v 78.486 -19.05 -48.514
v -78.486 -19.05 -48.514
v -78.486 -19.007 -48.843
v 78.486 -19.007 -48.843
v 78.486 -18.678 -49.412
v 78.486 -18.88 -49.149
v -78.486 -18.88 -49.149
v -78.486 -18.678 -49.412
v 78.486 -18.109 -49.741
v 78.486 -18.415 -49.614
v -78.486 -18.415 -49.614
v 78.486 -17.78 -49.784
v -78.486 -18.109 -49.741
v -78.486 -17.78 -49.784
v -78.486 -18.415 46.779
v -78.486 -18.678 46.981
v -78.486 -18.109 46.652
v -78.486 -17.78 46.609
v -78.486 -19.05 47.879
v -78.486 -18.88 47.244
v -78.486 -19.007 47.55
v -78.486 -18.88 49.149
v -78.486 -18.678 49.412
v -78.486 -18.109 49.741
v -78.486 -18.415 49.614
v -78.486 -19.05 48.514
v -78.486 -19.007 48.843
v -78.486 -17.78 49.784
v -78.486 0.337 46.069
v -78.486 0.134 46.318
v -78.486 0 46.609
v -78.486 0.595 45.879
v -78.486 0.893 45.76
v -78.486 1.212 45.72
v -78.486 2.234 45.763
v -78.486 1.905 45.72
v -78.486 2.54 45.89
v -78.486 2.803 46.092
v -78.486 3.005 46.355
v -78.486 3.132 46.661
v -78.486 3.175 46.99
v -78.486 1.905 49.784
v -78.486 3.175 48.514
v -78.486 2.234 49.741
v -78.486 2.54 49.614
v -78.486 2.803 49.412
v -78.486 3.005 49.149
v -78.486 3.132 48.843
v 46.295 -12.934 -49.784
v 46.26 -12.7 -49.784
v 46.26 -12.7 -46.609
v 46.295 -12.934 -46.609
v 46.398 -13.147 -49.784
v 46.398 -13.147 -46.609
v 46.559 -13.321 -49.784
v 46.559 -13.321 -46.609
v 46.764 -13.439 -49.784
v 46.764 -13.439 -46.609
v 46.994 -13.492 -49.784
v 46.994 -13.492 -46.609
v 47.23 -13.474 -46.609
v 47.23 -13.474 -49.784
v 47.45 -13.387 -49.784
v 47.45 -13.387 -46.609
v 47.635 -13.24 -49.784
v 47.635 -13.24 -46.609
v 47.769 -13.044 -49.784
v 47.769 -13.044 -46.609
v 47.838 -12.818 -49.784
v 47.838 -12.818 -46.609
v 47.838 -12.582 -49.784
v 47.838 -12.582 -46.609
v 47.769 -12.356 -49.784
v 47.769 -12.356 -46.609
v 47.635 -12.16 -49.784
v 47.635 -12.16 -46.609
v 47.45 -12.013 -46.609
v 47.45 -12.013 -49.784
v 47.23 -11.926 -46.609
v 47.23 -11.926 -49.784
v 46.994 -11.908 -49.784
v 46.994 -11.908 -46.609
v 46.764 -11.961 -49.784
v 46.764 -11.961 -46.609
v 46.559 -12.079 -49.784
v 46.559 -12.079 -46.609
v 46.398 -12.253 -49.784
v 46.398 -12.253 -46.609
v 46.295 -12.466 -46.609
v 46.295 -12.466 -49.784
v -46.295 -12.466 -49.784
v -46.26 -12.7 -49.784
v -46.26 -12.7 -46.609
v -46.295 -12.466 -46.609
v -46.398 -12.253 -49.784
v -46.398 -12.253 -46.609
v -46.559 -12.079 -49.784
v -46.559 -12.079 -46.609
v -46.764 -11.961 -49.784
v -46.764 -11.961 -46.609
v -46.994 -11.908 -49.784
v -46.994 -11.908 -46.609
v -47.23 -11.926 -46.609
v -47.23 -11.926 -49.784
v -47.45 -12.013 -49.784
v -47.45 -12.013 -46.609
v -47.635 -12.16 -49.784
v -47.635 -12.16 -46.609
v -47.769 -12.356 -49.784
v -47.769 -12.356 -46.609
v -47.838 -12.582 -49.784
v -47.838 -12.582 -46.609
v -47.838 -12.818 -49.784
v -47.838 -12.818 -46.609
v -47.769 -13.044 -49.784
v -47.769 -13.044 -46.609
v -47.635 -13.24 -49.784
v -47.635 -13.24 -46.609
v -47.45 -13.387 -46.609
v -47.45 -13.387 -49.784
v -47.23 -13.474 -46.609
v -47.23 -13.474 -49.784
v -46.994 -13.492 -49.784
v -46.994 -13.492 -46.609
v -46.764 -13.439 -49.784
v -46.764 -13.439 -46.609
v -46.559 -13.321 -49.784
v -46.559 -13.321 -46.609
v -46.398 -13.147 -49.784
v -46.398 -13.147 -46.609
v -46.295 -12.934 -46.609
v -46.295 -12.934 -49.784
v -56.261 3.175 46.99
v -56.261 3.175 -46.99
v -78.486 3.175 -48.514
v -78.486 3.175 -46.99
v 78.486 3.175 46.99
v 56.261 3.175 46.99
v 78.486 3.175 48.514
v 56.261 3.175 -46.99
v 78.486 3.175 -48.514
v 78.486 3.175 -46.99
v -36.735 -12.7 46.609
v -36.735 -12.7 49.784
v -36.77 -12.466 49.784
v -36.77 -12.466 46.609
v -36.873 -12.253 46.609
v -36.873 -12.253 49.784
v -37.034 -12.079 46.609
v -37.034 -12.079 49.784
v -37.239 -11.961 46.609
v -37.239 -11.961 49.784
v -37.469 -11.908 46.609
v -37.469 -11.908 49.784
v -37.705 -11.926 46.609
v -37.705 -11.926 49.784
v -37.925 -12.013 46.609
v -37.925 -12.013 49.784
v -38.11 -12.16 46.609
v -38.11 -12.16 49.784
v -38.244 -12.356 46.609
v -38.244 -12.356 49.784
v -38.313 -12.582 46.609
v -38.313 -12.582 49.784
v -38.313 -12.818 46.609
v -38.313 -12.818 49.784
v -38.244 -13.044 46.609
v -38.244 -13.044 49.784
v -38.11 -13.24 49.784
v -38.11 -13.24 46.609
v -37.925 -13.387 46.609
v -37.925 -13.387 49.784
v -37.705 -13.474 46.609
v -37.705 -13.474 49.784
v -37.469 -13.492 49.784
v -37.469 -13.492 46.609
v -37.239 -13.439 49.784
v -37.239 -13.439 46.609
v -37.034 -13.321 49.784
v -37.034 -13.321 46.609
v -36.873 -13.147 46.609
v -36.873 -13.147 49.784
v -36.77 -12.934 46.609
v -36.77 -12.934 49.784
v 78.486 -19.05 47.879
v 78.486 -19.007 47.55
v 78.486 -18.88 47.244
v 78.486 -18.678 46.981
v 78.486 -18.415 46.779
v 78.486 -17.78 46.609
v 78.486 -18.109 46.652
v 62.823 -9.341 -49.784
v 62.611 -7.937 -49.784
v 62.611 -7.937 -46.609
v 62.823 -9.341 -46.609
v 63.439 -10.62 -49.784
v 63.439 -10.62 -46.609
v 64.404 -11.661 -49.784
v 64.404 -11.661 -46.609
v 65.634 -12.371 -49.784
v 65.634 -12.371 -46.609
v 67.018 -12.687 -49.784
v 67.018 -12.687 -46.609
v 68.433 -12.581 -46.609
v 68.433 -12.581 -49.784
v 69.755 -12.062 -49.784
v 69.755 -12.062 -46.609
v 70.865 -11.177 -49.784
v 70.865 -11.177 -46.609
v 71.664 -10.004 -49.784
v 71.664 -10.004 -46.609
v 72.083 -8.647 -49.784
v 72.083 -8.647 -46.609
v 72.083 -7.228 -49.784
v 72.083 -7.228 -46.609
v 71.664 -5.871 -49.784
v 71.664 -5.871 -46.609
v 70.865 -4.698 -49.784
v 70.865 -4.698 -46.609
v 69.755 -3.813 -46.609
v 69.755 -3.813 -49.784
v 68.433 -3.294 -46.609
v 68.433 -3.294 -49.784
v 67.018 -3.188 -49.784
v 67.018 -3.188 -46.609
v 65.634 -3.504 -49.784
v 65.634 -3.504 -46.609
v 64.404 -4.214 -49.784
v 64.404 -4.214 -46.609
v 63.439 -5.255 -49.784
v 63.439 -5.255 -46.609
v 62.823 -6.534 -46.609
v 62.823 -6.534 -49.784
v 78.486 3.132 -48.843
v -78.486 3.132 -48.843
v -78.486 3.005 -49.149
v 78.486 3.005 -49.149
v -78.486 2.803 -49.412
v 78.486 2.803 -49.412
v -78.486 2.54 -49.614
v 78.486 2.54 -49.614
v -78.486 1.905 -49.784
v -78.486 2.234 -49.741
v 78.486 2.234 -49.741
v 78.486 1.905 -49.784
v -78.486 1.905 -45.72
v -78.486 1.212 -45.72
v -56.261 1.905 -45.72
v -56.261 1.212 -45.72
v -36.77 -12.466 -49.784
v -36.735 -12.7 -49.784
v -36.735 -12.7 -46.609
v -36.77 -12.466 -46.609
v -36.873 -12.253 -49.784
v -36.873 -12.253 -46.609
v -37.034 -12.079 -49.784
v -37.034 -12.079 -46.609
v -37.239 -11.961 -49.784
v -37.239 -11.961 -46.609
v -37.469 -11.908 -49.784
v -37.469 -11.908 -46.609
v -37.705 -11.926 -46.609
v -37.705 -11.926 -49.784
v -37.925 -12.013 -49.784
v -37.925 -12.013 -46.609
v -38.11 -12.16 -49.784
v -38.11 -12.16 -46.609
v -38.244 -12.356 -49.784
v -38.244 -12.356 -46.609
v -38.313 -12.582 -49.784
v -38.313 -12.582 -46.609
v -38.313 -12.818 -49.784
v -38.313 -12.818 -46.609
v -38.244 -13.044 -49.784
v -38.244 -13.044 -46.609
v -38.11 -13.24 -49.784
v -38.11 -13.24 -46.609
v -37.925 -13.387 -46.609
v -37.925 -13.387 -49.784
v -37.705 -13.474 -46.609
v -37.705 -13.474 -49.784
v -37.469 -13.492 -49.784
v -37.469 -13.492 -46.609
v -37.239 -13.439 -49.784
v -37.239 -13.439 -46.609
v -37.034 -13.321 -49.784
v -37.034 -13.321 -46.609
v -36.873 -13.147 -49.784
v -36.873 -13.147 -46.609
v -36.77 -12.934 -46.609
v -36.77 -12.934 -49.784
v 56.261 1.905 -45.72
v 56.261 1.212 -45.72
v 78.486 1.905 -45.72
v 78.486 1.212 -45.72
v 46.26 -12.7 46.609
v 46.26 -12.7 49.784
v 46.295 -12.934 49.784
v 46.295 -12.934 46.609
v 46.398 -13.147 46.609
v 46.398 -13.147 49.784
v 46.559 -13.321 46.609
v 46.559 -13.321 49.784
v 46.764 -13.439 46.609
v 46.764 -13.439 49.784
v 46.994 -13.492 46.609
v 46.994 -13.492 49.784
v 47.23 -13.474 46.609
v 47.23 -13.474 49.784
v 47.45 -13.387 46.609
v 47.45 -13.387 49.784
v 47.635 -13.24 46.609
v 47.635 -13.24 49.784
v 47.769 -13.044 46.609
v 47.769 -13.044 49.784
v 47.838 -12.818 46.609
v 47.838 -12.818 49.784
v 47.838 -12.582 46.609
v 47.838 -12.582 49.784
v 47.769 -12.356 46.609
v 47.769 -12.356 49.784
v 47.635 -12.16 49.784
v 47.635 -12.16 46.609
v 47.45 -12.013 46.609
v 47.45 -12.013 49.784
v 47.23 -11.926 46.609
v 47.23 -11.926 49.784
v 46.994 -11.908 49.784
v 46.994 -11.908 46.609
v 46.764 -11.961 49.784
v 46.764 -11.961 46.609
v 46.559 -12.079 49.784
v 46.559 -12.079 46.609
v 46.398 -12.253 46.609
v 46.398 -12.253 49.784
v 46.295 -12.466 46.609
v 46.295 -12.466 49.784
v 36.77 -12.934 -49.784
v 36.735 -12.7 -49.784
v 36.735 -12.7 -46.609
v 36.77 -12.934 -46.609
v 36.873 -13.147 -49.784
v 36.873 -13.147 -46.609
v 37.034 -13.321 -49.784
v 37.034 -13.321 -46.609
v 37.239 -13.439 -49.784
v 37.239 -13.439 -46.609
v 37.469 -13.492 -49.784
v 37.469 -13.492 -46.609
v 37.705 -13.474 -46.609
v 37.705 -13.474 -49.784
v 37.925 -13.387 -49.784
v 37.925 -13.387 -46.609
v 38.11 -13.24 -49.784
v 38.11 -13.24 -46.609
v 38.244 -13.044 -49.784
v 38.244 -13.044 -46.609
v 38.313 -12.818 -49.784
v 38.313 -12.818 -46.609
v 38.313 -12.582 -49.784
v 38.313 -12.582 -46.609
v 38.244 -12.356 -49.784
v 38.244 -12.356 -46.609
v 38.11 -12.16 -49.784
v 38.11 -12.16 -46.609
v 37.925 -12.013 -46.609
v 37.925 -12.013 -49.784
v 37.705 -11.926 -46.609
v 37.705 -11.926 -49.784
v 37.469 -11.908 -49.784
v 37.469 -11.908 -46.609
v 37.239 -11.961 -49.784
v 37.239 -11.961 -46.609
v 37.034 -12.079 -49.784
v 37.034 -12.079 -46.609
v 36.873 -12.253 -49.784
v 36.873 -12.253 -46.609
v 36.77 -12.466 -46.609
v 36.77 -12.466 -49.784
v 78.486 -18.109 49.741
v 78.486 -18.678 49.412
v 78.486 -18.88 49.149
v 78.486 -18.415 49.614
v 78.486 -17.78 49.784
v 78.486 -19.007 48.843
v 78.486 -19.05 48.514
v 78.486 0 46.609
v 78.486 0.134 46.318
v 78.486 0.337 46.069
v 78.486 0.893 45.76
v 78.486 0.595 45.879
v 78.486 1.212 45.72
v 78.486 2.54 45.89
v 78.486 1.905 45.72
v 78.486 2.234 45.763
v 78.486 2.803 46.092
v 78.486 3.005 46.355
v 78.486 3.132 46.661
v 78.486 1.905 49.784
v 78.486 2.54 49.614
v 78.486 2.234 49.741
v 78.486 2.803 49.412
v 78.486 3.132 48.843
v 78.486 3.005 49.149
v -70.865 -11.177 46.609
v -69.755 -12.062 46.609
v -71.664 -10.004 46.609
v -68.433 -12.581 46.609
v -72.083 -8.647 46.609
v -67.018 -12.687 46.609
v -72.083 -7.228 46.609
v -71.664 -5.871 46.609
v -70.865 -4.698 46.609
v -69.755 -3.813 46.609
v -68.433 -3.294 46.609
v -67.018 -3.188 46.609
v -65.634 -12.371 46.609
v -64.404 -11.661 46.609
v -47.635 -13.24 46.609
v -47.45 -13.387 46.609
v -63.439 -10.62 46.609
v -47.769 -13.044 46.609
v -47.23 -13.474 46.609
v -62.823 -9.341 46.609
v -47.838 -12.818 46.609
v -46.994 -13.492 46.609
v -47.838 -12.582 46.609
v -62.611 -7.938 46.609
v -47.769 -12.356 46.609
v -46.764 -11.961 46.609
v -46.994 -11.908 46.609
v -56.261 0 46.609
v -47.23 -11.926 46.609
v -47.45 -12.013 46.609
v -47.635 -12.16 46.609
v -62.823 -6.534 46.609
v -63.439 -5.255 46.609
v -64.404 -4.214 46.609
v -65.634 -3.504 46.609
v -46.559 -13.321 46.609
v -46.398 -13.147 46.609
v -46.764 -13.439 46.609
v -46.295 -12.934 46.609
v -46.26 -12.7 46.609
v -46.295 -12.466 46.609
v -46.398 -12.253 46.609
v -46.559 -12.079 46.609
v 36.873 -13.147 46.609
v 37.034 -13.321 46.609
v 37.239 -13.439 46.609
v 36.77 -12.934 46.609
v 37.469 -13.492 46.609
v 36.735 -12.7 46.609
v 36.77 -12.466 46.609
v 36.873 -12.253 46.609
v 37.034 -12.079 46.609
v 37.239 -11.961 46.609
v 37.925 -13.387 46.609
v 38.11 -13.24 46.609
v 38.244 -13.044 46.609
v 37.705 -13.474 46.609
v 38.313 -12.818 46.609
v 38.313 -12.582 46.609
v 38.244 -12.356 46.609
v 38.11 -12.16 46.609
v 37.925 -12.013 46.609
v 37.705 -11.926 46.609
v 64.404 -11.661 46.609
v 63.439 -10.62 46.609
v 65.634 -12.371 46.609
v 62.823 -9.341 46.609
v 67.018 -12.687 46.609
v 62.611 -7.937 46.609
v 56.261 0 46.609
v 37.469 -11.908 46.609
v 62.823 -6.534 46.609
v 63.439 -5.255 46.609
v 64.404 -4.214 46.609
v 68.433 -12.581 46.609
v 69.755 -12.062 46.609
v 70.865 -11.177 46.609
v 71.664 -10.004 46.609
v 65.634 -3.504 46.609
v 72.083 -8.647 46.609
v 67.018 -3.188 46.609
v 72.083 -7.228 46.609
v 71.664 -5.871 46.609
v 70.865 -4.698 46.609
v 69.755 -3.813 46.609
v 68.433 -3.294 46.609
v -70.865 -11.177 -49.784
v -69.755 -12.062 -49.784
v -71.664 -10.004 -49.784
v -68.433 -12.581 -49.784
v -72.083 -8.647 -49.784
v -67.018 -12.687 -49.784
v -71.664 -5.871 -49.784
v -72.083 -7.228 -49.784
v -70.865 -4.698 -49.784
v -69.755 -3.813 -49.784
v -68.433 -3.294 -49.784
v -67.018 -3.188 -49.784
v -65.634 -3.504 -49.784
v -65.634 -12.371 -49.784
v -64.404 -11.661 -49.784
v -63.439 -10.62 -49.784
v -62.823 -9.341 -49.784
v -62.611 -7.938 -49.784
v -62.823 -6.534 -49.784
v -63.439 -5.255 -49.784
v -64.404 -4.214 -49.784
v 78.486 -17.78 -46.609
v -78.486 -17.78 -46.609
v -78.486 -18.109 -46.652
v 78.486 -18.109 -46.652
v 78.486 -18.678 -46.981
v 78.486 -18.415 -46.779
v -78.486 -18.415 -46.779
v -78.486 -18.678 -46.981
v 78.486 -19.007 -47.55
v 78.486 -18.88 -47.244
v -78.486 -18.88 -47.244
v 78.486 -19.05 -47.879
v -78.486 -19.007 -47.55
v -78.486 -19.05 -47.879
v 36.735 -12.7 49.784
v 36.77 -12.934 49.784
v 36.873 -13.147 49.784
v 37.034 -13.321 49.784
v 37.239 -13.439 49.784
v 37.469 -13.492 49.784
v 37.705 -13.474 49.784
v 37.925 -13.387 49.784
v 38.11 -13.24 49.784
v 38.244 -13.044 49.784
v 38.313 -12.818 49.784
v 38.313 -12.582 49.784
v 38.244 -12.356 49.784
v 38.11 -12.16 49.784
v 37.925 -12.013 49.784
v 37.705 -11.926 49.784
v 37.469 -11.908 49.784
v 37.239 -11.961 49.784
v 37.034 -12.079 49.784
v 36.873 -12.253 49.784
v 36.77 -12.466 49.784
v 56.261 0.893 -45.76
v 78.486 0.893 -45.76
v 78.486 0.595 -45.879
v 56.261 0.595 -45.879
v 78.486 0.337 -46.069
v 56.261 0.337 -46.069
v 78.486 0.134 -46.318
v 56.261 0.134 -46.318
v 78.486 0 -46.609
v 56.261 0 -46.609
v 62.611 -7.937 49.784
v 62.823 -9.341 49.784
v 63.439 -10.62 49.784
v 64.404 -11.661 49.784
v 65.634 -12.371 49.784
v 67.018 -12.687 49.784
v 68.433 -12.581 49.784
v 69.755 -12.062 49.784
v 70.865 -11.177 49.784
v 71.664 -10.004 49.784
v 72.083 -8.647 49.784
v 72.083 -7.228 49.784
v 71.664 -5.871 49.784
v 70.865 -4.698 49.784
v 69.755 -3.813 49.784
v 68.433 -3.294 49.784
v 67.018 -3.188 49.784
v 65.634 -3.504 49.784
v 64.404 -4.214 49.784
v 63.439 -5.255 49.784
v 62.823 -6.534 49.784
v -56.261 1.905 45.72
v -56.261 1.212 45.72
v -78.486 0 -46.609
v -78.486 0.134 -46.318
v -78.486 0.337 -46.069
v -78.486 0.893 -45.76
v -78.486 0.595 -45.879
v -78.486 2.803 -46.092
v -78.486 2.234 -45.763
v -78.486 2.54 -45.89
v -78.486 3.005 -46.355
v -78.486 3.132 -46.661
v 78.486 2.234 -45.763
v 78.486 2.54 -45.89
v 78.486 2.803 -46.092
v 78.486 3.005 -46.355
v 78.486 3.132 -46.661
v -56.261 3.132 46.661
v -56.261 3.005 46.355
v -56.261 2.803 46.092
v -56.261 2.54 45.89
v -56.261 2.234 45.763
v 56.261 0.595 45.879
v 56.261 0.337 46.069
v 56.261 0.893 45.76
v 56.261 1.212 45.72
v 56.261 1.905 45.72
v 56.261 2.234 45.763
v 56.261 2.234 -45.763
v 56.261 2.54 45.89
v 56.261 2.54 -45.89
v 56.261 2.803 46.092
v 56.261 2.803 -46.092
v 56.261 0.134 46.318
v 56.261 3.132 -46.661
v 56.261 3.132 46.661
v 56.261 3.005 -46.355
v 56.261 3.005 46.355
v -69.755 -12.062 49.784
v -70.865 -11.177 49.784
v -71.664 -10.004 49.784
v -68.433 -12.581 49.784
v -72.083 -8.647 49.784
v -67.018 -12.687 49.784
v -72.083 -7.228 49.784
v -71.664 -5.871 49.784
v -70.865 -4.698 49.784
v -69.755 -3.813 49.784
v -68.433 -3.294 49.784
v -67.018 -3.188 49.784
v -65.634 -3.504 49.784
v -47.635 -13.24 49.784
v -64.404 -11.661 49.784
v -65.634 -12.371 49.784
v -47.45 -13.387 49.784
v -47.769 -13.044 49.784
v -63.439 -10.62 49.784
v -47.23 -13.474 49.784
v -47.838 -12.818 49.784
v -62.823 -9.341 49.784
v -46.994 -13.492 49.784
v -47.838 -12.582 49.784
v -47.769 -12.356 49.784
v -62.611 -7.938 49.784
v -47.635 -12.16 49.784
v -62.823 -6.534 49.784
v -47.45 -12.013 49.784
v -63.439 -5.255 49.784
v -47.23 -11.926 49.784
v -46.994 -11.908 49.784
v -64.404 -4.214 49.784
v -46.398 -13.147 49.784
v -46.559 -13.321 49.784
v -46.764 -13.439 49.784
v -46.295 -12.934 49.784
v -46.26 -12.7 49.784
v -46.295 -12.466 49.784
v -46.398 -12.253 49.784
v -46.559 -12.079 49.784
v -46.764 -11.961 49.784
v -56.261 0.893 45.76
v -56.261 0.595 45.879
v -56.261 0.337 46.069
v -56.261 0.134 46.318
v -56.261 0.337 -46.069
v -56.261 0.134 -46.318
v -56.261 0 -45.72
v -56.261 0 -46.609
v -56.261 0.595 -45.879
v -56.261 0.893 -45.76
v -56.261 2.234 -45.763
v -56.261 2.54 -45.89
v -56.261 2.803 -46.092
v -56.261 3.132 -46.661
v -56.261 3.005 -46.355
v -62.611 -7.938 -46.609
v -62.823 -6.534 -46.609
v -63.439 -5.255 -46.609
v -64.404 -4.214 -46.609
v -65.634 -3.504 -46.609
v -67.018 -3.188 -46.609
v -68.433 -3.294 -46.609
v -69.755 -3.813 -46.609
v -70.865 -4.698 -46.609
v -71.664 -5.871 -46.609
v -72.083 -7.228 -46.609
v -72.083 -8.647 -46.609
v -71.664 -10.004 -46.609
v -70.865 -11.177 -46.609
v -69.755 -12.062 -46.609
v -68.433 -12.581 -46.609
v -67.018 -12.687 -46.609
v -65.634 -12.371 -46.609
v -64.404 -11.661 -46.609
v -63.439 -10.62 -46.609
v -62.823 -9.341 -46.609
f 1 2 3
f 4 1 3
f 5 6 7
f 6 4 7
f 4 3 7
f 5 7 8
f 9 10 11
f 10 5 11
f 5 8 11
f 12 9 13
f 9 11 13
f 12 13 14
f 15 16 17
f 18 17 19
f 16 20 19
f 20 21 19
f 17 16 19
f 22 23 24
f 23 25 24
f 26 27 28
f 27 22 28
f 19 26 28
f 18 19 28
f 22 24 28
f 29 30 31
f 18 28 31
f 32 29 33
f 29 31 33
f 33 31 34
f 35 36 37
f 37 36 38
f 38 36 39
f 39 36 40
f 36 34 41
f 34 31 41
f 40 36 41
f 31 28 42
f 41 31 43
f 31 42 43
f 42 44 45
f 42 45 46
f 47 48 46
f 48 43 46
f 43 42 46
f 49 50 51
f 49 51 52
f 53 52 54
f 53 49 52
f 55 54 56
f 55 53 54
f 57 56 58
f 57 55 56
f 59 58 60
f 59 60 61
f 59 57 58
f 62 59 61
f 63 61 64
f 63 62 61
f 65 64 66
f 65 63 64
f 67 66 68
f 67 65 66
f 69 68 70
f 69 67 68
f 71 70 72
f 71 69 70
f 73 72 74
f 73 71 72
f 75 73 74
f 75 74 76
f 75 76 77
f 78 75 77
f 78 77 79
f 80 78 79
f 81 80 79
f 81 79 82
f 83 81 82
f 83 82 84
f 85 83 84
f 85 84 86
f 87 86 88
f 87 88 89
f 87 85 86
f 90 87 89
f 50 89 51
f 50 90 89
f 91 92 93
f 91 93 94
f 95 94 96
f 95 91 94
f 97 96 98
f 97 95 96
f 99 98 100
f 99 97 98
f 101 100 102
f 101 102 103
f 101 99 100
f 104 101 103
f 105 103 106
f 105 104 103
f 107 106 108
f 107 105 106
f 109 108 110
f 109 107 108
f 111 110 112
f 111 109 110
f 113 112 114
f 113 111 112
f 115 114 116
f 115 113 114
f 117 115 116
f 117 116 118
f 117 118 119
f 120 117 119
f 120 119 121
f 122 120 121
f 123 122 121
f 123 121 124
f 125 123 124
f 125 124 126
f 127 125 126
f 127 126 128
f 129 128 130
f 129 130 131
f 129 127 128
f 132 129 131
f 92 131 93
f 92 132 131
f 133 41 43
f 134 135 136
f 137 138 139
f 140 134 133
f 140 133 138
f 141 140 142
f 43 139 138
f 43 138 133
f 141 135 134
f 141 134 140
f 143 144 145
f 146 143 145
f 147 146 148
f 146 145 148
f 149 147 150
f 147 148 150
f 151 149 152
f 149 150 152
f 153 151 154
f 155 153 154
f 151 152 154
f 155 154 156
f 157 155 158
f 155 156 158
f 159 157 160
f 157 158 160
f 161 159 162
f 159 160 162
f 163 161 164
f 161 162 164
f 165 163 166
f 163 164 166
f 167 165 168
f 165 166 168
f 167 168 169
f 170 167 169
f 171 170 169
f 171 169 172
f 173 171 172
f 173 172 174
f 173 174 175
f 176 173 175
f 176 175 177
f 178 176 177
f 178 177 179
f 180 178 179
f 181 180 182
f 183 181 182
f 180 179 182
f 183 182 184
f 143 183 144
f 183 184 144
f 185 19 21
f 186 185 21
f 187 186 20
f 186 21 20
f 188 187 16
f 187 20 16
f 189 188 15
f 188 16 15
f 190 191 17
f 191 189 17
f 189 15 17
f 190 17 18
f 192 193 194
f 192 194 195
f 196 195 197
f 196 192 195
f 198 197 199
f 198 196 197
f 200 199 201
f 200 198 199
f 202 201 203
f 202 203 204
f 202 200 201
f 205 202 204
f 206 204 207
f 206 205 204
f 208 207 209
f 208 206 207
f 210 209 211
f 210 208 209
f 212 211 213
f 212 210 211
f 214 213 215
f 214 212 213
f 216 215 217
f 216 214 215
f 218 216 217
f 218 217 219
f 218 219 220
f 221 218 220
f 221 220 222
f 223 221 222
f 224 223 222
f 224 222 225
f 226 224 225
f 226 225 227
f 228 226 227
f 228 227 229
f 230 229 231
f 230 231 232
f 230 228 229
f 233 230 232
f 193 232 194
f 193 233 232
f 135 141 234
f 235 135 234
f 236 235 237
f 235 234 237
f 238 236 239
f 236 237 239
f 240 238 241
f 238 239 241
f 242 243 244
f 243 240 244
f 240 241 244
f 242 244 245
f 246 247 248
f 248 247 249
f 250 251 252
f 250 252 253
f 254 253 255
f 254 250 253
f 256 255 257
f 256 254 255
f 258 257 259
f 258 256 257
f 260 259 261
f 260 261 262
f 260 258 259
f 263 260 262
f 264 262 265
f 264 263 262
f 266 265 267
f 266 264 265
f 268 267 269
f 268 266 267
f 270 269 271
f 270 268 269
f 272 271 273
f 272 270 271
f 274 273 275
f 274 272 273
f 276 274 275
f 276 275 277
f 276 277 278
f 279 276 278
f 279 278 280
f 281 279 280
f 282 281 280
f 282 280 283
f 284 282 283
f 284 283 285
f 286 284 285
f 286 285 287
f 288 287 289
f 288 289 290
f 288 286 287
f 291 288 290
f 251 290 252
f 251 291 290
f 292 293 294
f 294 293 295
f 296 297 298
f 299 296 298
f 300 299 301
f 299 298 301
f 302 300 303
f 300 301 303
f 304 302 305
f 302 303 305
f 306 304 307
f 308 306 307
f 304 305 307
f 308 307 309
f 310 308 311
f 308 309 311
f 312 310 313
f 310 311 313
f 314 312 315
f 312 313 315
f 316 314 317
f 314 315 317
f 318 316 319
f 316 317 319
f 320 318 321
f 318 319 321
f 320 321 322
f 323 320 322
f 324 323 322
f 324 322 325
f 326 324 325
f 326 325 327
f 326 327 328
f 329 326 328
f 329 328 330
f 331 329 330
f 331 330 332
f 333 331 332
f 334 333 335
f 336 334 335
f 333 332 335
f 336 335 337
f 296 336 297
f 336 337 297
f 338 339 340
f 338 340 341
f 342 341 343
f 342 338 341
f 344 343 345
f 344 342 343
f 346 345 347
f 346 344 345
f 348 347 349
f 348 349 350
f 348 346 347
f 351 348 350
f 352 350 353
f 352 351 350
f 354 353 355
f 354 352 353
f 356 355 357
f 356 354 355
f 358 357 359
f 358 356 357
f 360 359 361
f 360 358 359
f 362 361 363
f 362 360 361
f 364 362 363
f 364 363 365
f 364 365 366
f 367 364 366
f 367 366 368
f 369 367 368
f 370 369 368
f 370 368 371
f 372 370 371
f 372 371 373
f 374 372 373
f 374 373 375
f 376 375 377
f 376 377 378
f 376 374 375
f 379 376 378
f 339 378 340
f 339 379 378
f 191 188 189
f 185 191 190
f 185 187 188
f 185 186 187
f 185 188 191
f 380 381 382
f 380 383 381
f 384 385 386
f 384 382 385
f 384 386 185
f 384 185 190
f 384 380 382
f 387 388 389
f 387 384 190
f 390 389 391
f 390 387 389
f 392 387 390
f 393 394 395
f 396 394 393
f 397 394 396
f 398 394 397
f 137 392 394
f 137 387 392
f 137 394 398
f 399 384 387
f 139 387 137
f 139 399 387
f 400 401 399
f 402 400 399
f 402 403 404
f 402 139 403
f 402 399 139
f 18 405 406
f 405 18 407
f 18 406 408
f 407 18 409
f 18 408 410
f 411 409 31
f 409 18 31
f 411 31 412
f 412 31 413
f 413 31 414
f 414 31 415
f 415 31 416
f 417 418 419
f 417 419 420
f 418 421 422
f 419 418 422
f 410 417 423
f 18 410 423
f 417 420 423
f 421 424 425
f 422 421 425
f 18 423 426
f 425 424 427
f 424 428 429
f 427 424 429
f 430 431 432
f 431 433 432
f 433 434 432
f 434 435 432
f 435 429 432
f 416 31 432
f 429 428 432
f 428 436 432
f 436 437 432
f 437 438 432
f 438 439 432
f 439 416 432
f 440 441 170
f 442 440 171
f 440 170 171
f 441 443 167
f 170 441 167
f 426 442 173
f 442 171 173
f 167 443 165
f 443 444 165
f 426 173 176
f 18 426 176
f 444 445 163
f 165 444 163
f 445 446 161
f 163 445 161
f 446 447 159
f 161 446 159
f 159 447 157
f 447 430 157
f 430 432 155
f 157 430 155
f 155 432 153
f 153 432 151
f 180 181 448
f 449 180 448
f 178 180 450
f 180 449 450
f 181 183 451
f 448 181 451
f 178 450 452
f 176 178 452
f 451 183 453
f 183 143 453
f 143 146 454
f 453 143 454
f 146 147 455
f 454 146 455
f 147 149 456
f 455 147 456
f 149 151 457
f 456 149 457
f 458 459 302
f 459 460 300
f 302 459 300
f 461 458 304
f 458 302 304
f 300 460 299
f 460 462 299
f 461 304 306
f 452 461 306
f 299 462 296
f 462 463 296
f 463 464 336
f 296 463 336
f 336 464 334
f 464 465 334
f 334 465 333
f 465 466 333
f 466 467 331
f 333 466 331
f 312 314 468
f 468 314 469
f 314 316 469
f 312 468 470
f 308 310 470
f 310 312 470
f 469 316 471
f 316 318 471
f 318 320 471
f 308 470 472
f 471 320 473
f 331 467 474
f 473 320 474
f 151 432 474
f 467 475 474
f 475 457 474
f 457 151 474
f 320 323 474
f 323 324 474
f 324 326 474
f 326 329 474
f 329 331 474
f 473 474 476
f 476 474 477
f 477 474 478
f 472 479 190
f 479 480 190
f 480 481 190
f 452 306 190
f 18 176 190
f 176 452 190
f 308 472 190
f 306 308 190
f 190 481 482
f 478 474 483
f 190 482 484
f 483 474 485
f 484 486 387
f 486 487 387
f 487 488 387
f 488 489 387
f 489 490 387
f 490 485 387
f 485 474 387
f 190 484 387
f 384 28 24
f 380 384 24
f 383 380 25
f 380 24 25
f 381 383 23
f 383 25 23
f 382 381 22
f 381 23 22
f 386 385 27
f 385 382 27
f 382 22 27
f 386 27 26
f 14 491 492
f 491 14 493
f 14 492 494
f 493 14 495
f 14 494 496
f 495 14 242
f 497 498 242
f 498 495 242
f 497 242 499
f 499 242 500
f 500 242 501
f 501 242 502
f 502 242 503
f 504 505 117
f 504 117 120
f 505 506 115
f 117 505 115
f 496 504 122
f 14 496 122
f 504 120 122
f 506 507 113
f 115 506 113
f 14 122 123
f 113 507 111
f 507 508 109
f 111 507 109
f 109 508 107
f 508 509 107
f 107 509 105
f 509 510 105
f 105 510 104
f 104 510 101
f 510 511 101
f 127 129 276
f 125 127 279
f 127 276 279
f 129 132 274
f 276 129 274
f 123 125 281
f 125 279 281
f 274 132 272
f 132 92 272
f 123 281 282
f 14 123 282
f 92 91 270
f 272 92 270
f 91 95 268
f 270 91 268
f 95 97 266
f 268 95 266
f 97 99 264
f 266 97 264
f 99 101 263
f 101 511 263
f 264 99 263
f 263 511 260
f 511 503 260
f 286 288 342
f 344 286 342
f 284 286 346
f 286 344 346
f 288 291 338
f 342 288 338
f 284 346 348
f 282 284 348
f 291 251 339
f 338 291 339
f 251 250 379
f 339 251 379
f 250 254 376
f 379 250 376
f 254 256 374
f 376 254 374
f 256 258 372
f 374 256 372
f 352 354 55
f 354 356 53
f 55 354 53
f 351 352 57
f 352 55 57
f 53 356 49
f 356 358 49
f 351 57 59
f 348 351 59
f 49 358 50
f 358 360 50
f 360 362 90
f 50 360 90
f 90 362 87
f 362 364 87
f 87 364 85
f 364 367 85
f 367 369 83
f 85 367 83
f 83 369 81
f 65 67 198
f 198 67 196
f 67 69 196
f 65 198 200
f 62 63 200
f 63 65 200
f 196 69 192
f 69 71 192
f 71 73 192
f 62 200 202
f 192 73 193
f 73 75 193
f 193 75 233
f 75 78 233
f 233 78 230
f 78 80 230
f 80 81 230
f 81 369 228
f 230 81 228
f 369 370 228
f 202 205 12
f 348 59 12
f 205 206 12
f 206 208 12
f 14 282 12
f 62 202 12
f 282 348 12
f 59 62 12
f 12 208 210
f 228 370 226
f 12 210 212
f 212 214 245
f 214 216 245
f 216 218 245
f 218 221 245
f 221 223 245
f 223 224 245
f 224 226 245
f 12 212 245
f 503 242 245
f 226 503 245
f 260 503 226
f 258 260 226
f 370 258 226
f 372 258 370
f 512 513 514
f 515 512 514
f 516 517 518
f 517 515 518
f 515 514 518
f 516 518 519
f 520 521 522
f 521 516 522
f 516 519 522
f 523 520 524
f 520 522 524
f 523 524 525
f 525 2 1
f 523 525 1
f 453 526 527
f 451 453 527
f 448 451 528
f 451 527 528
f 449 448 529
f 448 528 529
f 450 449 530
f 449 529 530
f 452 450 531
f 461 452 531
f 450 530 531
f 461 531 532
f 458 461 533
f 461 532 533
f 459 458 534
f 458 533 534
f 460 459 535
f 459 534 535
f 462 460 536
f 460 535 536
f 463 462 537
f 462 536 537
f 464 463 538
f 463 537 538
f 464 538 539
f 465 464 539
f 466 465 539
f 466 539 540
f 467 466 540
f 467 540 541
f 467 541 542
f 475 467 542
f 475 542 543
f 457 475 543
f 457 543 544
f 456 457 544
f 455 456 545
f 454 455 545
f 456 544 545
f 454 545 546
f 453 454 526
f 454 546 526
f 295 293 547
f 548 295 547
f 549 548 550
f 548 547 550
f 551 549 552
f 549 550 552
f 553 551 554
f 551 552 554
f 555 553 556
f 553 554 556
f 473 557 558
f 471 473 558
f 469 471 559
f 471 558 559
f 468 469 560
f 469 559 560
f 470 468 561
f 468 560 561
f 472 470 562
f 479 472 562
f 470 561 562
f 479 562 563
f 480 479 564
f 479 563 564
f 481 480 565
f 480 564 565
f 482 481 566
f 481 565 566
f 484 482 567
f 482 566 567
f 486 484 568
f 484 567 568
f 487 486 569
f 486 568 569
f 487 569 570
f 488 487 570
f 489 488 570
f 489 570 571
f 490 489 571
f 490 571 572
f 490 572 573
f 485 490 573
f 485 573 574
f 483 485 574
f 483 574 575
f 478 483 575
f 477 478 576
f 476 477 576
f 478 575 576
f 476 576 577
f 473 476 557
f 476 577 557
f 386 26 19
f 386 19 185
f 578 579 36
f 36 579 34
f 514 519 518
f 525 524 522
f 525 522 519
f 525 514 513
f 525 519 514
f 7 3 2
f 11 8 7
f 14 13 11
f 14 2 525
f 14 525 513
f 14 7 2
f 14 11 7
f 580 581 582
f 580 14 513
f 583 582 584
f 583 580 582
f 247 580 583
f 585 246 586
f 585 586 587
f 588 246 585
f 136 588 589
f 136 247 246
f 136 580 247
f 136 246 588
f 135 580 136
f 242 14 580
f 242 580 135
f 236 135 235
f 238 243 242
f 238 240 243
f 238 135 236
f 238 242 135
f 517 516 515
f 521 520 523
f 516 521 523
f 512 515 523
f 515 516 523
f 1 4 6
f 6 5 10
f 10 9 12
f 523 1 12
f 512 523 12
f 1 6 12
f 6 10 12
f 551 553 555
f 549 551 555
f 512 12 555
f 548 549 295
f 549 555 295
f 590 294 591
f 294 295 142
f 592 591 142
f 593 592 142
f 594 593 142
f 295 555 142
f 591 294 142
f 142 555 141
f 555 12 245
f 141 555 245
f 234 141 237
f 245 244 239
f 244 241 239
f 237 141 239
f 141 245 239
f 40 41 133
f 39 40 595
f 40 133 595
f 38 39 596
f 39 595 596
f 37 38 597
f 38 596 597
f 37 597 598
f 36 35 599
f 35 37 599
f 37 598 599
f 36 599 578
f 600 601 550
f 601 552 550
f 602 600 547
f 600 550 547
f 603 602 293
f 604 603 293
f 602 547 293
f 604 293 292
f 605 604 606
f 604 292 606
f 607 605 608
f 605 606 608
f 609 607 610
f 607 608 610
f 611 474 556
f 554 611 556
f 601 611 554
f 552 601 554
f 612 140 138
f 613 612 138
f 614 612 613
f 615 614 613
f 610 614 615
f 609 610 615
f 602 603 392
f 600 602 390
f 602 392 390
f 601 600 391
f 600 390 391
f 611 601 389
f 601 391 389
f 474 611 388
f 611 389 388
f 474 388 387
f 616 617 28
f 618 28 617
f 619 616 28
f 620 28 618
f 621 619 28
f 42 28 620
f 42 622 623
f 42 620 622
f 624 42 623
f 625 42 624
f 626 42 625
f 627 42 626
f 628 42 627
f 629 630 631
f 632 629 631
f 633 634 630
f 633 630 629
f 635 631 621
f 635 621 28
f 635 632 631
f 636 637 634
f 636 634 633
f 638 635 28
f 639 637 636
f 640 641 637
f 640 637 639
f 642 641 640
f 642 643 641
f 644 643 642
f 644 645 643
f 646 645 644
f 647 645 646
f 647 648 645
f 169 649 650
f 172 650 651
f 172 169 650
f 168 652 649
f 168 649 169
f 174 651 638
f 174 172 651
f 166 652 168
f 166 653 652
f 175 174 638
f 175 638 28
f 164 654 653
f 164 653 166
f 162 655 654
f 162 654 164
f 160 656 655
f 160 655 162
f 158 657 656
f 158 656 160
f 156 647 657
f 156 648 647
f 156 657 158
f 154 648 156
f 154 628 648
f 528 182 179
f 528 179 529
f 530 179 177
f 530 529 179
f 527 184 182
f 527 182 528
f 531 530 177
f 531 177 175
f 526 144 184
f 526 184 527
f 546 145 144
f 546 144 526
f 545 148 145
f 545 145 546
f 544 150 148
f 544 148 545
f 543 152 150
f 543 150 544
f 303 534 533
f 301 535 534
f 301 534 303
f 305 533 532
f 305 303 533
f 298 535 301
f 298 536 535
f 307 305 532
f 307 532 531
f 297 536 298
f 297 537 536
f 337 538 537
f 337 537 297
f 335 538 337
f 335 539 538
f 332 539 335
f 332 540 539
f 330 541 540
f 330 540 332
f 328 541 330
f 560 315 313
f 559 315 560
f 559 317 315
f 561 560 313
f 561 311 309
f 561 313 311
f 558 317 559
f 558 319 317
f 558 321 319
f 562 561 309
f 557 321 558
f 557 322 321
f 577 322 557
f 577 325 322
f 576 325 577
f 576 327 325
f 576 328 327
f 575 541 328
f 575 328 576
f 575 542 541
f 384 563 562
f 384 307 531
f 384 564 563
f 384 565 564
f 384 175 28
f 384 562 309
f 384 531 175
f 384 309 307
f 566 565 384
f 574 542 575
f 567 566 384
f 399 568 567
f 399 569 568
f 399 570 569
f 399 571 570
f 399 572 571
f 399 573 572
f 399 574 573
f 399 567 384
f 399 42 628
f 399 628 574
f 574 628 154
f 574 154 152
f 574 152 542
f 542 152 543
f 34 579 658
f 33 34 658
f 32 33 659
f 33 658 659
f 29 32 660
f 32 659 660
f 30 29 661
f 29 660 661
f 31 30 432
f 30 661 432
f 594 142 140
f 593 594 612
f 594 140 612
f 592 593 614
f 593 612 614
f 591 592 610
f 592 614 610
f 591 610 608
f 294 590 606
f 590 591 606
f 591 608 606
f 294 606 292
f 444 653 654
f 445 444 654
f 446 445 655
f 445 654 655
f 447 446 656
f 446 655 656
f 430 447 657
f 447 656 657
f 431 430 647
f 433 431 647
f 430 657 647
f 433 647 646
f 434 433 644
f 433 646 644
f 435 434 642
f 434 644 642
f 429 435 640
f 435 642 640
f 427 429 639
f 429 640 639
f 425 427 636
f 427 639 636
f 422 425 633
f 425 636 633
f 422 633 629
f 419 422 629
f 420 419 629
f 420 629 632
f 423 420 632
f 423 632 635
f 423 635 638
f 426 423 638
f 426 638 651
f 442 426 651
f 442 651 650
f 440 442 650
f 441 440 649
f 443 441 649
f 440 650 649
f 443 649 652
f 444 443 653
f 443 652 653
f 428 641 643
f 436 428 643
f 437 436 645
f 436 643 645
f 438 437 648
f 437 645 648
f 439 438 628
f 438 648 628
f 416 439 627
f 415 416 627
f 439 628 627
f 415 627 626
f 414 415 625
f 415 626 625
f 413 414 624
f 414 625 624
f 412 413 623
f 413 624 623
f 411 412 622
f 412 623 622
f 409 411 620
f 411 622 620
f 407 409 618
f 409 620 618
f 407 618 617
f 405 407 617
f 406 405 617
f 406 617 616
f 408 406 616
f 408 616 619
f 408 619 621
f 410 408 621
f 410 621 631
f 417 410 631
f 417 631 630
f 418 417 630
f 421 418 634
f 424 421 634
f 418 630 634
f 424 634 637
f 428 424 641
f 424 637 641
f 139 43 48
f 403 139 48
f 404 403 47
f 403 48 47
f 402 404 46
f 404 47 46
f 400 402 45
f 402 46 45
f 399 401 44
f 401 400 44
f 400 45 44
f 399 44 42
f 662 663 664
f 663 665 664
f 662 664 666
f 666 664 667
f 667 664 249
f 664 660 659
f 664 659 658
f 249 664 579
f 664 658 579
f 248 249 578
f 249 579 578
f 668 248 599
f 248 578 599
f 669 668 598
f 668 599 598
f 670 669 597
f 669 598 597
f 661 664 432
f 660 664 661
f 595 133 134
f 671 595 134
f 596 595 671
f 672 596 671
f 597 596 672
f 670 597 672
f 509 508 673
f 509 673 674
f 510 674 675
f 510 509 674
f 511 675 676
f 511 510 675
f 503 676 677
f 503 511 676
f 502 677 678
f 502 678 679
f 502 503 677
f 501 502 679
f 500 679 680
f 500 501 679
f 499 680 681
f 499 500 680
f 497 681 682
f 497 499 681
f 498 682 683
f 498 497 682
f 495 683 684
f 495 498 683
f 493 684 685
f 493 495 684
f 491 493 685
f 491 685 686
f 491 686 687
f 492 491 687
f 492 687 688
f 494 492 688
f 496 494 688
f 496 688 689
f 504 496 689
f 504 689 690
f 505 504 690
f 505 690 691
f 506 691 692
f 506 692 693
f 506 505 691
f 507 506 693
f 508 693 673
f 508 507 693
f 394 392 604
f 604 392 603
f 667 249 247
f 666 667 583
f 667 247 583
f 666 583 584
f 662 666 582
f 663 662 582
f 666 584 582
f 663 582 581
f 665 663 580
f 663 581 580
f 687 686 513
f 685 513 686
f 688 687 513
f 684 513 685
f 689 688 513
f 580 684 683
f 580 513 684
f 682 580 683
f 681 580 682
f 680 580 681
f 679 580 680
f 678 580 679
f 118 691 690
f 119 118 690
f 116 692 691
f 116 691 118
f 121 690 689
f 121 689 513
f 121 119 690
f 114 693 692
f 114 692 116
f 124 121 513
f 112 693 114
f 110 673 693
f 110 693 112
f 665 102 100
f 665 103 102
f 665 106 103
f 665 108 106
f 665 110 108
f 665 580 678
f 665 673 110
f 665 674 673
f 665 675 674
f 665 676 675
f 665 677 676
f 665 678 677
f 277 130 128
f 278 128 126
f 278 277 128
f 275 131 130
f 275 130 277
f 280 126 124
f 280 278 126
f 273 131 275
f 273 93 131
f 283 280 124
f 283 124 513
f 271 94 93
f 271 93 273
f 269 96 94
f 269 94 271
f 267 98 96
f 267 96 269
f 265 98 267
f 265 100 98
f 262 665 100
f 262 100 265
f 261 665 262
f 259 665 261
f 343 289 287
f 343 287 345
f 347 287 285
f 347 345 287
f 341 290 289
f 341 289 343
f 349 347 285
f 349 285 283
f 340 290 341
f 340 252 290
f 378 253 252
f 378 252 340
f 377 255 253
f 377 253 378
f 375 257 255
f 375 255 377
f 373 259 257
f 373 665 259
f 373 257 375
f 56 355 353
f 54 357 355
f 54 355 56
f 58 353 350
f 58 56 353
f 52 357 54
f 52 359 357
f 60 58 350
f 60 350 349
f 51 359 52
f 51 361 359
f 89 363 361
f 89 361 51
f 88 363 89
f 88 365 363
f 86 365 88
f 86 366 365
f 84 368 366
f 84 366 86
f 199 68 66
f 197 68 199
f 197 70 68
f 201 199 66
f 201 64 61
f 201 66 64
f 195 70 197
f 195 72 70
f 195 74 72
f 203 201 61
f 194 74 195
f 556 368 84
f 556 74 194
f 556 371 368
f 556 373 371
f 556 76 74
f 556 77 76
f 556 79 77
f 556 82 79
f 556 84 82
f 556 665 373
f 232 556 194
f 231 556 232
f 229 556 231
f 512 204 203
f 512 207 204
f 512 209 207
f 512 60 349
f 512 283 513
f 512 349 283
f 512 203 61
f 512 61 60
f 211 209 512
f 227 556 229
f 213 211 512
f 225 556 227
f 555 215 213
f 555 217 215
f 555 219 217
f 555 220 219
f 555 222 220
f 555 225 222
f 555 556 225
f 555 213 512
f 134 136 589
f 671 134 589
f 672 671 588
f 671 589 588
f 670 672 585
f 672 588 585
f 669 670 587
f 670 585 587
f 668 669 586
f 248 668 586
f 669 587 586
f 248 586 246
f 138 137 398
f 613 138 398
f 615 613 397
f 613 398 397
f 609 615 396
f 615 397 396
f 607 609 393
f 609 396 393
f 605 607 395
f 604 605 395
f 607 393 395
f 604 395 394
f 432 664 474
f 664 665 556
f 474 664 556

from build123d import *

# Parameters (mm, degrees)
BOSS_EXTRUDE1_DEPTH = 3.175
SKETCH2_W           = 156.972
SKETCH2_H           = 22.225
SKETCH2_R           = 4.7625
SKETCH2_R_2         = 0.79375
BOSS_EXTRUDE2_DEPTH = 3.175
FILLET2_R           = 1.27


with BuildPart() as part:
    # Sketch1 → Boss-Extrude1 (new body)
    with BuildSketch(Plane(origin=(0, 0, 0), x_dir=(1, 0, 0), z_dir=(0, 1, 0))):
        Polygon((-78.486, 49.784), (-78.486, 45.72), (-56.261, 45.72), (-56.261, -45.72), (-78.486, -45.72), (-78.486, -49.784), (78.486, -49.784), (78.486, -45.72), (56.261, -45.72), (56.261, 45.72), (78.486, 45.72), (78.486, 49.784), align=None)
    extrude(amount=BOSS_EXTRUDE1_DEPTH)

    # Sketch2 → Boss-Extrude2 (add)
    with BuildSketch(Plane.XY.offset(49.784)):
        with Locations((0, -7.9375)):
            Rectangle(SKETCH2_W, SKETCH2_H)
        with Locations((-67.3735, -7.9375)):
            Circle(SKETCH2_R, mode=Mode.SUBTRACT)
        with Locations(Location((67.3735, -7.9375, 0), (0, 0, 180))):
            Circle(SKETCH2_R, mode=Mode.SUBTRACT)
        with Locations((-47.0535, -12.7)):
            Circle(SKETCH2_R_2, mode=Mode.SUBTRACT)
        with Locations((-37.5285, -12.7)):
            Circle(SKETCH2_R_2, mode=Mode.SUBTRACT)
        with Locations(Location((37.5285, -12.7, 0), (0, 0, 180))):
            Circle(SKETCH2_R_2, mode=Mode.SUBTRACT)
        with Locations(Location((47.0535, -12.7, 0), (0, 0, 180))):
            Circle(SKETCH2_R_2, mode=Mode.SUBTRACT)
    boss_extrude2 = extrude(amount=-BOSS_EXTRUDE2_DEPTH)

    # Mirror2: Boss-Extrude2 across plane
    add(boss_extrude2.mirror(Plane.XY))

    # Fillet2
    # the kernel refuses this fillet: 1.27 mm, written as the material it takes off along each edge
    with BuildSketch(Plane(origin=(-56.261, 0, 45.72), x_dir=(0, 1, 0), z_dir=(-1, 0, 0)), Plane(origin=(56.261, 0, -45.72), x_dir=(0, 1, 0), z_dir=(1, 0, 0)), Plane(origin=(81.514756964, 0, 45.72), x_dir=(0, 1, 0), z_dir=(-1, 0, 0))) as fillet2_piece_1:
        with BuildLine():
            CenterArc((1.211502786, -1.27), FILLET2_R, 90, 72.542396876)
            Line((0, -0.889), (-0.024230056, -0.88138))
            ThreePointArc((-0.024230056, -0.88138), (-0.0254, -0.4445), (-0.0254, 0))
            Line((-0.0254, 0), (0, 0.0254))
            Line((0, 0.0254), (1.211502786, 0.0254))
            Line((1.211502786, 0.0254), (1.211502786, 0))
        make_face()
    extrude(amount=25.253756964, mode=Mode.SUBTRACT)
    with BuildSketch(Plane(origin=(-81.514756964, 0, -45.72), x_dir=(0, 0, -1), z_dir=(1, 0, 0))) as fillet2_piece_2:
        with BuildLine():
            CenterArc((1.27, 1.211502786), FILLET2_R, 180, 72.542396876)
            Line((0, 1.211502786), (-0.0254, 1.211502786))
            Line((-0.0254, 1.211502786), (-0.0254, 0))
            Line((-0.0254, 0), (0, -0.0254))
            ThreePointArc((0, -0.0254), (0.4445, -0.0254), (0.88138, -0.024230056))
            Line((0.88138, -0.024230056), (0.889, 0))
        make_face()
    extrude(amount=25.253756964, mode=Mode.SUBTRACT)
    with BuildSketch(Plane(origin=(81.661, 3.175, 45.72), x_dir=(0, -1, 0), z_dir=(-1, 0, 0)), Plane(origin=(56.261, 3.175, -45.72), x_dir=(0, -1, 0), z_dir=(1, 0, 0)), Plane(origin=(-81.661, 3.175, -45.72), x_dir=(0, -1, 0), z_dir=(1, 0, 0)), Plane(origin=(-56.261, 3.175, 45.72), x_dir=(0, -1, 0), z_dir=(-1, 0, 0))) as fillet2_piece_3:
        with BuildLine():
            CenterArc((FILLET2_R, FILLET2_R), FILLET2_R, 180, 90)
            Line((0, FILLET2_R), (-FILLET2_R * 0.02, FILLET2_R))
            Line((-FILLET2_R * 0.02, FILLET2_R), (-FILLET2_R * 0.02, -FILLET2_R * 0.02))
            Line((-FILLET2_R * 0.02, -FILLET2_R * 0.02), (FILLET2_R, -FILLET2_R * 0.02))
            Line((FILLET2_R, -FILLET2_R * 0.02), (FILLET2_R, 0))
        make_face()
    extrude(amount=25.4, mode=Mode.SUBTRACT)
    with BuildSketch(Plane(origin=(-81.661, -19.05, -46.609), x_dir=(0, 0, -1), z_dir=(1, 0, 0)), Plane(origin=(-81.661, -19.05, -49.784), x_dir=(0, 1, 0), z_dir=(1, 0, 0)), Plane(origin=(-81.661, 3.175, 49.784), x_dir=(0, -1, 0), z_dir=(1, 0, 0)), Plane(origin=(81.661, 3.175, -49.784), x_dir=(0, -1, 0), z_dir=(-1, 0, 0))) as fillet2_piece_4:
        with BuildLine():
            CenterArc((FILLET2_R, FILLET2_R), FILLET2_R, 180, 90)
            Line((0, FILLET2_R), (-FILLET2_R * 0.02, FILLET2_R))
            Line((-FILLET2_R * 0.02, FILLET2_R), (-FILLET2_R * 0.02, -FILLET2_R * 0.02))
            Line((-FILLET2_R * 0.02, -FILLET2_R * 0.02), (FILLET2_R, -FILLET2_R * 0.02))
            Line((FILLET2_R, -FILLET2_R * 0.02), (FILLET2_R, 0))
        make_face()
    extrude(amount=163.322, mode=Mode.SUBTRACT)
    with BuildSketch(Plane(origin=(-81.661, -19.05, 46.609), x_dir=(0, 0, 1), z_dir=(1, 0, 0)), Plane(origin=(-81.661, -19.05, 49.784), x_dir=(0, 1, 0), z_dir=(1, 0, 0))) as fillet2_piece_5:
        with BuildLine():
            CenterArc((FILLET2_R, -FILLET2_R), FILLET2_R, 90, 90)
            Line((0, -FILLET2_R), (-FILLET2_R * 0.02, -FILLET2_R))
            Line((-FILLET2_R * 0.02, -FILLET2_R), (-FILLET2_R * 0.02, FILLET2_R * 0.02))
            Line((-FILLET2_R * 0.02, FILLET2_R * 0.02), (FILLET2_R, FILLET2_R * 0.02))
            Line((FILLET2_R, FILLET2_R * 0.02), (FILLET2_R, 0))
        make_face()
    extrude(amount=163.322, mode=Mode.SUBTRACT)


solid = part.part
